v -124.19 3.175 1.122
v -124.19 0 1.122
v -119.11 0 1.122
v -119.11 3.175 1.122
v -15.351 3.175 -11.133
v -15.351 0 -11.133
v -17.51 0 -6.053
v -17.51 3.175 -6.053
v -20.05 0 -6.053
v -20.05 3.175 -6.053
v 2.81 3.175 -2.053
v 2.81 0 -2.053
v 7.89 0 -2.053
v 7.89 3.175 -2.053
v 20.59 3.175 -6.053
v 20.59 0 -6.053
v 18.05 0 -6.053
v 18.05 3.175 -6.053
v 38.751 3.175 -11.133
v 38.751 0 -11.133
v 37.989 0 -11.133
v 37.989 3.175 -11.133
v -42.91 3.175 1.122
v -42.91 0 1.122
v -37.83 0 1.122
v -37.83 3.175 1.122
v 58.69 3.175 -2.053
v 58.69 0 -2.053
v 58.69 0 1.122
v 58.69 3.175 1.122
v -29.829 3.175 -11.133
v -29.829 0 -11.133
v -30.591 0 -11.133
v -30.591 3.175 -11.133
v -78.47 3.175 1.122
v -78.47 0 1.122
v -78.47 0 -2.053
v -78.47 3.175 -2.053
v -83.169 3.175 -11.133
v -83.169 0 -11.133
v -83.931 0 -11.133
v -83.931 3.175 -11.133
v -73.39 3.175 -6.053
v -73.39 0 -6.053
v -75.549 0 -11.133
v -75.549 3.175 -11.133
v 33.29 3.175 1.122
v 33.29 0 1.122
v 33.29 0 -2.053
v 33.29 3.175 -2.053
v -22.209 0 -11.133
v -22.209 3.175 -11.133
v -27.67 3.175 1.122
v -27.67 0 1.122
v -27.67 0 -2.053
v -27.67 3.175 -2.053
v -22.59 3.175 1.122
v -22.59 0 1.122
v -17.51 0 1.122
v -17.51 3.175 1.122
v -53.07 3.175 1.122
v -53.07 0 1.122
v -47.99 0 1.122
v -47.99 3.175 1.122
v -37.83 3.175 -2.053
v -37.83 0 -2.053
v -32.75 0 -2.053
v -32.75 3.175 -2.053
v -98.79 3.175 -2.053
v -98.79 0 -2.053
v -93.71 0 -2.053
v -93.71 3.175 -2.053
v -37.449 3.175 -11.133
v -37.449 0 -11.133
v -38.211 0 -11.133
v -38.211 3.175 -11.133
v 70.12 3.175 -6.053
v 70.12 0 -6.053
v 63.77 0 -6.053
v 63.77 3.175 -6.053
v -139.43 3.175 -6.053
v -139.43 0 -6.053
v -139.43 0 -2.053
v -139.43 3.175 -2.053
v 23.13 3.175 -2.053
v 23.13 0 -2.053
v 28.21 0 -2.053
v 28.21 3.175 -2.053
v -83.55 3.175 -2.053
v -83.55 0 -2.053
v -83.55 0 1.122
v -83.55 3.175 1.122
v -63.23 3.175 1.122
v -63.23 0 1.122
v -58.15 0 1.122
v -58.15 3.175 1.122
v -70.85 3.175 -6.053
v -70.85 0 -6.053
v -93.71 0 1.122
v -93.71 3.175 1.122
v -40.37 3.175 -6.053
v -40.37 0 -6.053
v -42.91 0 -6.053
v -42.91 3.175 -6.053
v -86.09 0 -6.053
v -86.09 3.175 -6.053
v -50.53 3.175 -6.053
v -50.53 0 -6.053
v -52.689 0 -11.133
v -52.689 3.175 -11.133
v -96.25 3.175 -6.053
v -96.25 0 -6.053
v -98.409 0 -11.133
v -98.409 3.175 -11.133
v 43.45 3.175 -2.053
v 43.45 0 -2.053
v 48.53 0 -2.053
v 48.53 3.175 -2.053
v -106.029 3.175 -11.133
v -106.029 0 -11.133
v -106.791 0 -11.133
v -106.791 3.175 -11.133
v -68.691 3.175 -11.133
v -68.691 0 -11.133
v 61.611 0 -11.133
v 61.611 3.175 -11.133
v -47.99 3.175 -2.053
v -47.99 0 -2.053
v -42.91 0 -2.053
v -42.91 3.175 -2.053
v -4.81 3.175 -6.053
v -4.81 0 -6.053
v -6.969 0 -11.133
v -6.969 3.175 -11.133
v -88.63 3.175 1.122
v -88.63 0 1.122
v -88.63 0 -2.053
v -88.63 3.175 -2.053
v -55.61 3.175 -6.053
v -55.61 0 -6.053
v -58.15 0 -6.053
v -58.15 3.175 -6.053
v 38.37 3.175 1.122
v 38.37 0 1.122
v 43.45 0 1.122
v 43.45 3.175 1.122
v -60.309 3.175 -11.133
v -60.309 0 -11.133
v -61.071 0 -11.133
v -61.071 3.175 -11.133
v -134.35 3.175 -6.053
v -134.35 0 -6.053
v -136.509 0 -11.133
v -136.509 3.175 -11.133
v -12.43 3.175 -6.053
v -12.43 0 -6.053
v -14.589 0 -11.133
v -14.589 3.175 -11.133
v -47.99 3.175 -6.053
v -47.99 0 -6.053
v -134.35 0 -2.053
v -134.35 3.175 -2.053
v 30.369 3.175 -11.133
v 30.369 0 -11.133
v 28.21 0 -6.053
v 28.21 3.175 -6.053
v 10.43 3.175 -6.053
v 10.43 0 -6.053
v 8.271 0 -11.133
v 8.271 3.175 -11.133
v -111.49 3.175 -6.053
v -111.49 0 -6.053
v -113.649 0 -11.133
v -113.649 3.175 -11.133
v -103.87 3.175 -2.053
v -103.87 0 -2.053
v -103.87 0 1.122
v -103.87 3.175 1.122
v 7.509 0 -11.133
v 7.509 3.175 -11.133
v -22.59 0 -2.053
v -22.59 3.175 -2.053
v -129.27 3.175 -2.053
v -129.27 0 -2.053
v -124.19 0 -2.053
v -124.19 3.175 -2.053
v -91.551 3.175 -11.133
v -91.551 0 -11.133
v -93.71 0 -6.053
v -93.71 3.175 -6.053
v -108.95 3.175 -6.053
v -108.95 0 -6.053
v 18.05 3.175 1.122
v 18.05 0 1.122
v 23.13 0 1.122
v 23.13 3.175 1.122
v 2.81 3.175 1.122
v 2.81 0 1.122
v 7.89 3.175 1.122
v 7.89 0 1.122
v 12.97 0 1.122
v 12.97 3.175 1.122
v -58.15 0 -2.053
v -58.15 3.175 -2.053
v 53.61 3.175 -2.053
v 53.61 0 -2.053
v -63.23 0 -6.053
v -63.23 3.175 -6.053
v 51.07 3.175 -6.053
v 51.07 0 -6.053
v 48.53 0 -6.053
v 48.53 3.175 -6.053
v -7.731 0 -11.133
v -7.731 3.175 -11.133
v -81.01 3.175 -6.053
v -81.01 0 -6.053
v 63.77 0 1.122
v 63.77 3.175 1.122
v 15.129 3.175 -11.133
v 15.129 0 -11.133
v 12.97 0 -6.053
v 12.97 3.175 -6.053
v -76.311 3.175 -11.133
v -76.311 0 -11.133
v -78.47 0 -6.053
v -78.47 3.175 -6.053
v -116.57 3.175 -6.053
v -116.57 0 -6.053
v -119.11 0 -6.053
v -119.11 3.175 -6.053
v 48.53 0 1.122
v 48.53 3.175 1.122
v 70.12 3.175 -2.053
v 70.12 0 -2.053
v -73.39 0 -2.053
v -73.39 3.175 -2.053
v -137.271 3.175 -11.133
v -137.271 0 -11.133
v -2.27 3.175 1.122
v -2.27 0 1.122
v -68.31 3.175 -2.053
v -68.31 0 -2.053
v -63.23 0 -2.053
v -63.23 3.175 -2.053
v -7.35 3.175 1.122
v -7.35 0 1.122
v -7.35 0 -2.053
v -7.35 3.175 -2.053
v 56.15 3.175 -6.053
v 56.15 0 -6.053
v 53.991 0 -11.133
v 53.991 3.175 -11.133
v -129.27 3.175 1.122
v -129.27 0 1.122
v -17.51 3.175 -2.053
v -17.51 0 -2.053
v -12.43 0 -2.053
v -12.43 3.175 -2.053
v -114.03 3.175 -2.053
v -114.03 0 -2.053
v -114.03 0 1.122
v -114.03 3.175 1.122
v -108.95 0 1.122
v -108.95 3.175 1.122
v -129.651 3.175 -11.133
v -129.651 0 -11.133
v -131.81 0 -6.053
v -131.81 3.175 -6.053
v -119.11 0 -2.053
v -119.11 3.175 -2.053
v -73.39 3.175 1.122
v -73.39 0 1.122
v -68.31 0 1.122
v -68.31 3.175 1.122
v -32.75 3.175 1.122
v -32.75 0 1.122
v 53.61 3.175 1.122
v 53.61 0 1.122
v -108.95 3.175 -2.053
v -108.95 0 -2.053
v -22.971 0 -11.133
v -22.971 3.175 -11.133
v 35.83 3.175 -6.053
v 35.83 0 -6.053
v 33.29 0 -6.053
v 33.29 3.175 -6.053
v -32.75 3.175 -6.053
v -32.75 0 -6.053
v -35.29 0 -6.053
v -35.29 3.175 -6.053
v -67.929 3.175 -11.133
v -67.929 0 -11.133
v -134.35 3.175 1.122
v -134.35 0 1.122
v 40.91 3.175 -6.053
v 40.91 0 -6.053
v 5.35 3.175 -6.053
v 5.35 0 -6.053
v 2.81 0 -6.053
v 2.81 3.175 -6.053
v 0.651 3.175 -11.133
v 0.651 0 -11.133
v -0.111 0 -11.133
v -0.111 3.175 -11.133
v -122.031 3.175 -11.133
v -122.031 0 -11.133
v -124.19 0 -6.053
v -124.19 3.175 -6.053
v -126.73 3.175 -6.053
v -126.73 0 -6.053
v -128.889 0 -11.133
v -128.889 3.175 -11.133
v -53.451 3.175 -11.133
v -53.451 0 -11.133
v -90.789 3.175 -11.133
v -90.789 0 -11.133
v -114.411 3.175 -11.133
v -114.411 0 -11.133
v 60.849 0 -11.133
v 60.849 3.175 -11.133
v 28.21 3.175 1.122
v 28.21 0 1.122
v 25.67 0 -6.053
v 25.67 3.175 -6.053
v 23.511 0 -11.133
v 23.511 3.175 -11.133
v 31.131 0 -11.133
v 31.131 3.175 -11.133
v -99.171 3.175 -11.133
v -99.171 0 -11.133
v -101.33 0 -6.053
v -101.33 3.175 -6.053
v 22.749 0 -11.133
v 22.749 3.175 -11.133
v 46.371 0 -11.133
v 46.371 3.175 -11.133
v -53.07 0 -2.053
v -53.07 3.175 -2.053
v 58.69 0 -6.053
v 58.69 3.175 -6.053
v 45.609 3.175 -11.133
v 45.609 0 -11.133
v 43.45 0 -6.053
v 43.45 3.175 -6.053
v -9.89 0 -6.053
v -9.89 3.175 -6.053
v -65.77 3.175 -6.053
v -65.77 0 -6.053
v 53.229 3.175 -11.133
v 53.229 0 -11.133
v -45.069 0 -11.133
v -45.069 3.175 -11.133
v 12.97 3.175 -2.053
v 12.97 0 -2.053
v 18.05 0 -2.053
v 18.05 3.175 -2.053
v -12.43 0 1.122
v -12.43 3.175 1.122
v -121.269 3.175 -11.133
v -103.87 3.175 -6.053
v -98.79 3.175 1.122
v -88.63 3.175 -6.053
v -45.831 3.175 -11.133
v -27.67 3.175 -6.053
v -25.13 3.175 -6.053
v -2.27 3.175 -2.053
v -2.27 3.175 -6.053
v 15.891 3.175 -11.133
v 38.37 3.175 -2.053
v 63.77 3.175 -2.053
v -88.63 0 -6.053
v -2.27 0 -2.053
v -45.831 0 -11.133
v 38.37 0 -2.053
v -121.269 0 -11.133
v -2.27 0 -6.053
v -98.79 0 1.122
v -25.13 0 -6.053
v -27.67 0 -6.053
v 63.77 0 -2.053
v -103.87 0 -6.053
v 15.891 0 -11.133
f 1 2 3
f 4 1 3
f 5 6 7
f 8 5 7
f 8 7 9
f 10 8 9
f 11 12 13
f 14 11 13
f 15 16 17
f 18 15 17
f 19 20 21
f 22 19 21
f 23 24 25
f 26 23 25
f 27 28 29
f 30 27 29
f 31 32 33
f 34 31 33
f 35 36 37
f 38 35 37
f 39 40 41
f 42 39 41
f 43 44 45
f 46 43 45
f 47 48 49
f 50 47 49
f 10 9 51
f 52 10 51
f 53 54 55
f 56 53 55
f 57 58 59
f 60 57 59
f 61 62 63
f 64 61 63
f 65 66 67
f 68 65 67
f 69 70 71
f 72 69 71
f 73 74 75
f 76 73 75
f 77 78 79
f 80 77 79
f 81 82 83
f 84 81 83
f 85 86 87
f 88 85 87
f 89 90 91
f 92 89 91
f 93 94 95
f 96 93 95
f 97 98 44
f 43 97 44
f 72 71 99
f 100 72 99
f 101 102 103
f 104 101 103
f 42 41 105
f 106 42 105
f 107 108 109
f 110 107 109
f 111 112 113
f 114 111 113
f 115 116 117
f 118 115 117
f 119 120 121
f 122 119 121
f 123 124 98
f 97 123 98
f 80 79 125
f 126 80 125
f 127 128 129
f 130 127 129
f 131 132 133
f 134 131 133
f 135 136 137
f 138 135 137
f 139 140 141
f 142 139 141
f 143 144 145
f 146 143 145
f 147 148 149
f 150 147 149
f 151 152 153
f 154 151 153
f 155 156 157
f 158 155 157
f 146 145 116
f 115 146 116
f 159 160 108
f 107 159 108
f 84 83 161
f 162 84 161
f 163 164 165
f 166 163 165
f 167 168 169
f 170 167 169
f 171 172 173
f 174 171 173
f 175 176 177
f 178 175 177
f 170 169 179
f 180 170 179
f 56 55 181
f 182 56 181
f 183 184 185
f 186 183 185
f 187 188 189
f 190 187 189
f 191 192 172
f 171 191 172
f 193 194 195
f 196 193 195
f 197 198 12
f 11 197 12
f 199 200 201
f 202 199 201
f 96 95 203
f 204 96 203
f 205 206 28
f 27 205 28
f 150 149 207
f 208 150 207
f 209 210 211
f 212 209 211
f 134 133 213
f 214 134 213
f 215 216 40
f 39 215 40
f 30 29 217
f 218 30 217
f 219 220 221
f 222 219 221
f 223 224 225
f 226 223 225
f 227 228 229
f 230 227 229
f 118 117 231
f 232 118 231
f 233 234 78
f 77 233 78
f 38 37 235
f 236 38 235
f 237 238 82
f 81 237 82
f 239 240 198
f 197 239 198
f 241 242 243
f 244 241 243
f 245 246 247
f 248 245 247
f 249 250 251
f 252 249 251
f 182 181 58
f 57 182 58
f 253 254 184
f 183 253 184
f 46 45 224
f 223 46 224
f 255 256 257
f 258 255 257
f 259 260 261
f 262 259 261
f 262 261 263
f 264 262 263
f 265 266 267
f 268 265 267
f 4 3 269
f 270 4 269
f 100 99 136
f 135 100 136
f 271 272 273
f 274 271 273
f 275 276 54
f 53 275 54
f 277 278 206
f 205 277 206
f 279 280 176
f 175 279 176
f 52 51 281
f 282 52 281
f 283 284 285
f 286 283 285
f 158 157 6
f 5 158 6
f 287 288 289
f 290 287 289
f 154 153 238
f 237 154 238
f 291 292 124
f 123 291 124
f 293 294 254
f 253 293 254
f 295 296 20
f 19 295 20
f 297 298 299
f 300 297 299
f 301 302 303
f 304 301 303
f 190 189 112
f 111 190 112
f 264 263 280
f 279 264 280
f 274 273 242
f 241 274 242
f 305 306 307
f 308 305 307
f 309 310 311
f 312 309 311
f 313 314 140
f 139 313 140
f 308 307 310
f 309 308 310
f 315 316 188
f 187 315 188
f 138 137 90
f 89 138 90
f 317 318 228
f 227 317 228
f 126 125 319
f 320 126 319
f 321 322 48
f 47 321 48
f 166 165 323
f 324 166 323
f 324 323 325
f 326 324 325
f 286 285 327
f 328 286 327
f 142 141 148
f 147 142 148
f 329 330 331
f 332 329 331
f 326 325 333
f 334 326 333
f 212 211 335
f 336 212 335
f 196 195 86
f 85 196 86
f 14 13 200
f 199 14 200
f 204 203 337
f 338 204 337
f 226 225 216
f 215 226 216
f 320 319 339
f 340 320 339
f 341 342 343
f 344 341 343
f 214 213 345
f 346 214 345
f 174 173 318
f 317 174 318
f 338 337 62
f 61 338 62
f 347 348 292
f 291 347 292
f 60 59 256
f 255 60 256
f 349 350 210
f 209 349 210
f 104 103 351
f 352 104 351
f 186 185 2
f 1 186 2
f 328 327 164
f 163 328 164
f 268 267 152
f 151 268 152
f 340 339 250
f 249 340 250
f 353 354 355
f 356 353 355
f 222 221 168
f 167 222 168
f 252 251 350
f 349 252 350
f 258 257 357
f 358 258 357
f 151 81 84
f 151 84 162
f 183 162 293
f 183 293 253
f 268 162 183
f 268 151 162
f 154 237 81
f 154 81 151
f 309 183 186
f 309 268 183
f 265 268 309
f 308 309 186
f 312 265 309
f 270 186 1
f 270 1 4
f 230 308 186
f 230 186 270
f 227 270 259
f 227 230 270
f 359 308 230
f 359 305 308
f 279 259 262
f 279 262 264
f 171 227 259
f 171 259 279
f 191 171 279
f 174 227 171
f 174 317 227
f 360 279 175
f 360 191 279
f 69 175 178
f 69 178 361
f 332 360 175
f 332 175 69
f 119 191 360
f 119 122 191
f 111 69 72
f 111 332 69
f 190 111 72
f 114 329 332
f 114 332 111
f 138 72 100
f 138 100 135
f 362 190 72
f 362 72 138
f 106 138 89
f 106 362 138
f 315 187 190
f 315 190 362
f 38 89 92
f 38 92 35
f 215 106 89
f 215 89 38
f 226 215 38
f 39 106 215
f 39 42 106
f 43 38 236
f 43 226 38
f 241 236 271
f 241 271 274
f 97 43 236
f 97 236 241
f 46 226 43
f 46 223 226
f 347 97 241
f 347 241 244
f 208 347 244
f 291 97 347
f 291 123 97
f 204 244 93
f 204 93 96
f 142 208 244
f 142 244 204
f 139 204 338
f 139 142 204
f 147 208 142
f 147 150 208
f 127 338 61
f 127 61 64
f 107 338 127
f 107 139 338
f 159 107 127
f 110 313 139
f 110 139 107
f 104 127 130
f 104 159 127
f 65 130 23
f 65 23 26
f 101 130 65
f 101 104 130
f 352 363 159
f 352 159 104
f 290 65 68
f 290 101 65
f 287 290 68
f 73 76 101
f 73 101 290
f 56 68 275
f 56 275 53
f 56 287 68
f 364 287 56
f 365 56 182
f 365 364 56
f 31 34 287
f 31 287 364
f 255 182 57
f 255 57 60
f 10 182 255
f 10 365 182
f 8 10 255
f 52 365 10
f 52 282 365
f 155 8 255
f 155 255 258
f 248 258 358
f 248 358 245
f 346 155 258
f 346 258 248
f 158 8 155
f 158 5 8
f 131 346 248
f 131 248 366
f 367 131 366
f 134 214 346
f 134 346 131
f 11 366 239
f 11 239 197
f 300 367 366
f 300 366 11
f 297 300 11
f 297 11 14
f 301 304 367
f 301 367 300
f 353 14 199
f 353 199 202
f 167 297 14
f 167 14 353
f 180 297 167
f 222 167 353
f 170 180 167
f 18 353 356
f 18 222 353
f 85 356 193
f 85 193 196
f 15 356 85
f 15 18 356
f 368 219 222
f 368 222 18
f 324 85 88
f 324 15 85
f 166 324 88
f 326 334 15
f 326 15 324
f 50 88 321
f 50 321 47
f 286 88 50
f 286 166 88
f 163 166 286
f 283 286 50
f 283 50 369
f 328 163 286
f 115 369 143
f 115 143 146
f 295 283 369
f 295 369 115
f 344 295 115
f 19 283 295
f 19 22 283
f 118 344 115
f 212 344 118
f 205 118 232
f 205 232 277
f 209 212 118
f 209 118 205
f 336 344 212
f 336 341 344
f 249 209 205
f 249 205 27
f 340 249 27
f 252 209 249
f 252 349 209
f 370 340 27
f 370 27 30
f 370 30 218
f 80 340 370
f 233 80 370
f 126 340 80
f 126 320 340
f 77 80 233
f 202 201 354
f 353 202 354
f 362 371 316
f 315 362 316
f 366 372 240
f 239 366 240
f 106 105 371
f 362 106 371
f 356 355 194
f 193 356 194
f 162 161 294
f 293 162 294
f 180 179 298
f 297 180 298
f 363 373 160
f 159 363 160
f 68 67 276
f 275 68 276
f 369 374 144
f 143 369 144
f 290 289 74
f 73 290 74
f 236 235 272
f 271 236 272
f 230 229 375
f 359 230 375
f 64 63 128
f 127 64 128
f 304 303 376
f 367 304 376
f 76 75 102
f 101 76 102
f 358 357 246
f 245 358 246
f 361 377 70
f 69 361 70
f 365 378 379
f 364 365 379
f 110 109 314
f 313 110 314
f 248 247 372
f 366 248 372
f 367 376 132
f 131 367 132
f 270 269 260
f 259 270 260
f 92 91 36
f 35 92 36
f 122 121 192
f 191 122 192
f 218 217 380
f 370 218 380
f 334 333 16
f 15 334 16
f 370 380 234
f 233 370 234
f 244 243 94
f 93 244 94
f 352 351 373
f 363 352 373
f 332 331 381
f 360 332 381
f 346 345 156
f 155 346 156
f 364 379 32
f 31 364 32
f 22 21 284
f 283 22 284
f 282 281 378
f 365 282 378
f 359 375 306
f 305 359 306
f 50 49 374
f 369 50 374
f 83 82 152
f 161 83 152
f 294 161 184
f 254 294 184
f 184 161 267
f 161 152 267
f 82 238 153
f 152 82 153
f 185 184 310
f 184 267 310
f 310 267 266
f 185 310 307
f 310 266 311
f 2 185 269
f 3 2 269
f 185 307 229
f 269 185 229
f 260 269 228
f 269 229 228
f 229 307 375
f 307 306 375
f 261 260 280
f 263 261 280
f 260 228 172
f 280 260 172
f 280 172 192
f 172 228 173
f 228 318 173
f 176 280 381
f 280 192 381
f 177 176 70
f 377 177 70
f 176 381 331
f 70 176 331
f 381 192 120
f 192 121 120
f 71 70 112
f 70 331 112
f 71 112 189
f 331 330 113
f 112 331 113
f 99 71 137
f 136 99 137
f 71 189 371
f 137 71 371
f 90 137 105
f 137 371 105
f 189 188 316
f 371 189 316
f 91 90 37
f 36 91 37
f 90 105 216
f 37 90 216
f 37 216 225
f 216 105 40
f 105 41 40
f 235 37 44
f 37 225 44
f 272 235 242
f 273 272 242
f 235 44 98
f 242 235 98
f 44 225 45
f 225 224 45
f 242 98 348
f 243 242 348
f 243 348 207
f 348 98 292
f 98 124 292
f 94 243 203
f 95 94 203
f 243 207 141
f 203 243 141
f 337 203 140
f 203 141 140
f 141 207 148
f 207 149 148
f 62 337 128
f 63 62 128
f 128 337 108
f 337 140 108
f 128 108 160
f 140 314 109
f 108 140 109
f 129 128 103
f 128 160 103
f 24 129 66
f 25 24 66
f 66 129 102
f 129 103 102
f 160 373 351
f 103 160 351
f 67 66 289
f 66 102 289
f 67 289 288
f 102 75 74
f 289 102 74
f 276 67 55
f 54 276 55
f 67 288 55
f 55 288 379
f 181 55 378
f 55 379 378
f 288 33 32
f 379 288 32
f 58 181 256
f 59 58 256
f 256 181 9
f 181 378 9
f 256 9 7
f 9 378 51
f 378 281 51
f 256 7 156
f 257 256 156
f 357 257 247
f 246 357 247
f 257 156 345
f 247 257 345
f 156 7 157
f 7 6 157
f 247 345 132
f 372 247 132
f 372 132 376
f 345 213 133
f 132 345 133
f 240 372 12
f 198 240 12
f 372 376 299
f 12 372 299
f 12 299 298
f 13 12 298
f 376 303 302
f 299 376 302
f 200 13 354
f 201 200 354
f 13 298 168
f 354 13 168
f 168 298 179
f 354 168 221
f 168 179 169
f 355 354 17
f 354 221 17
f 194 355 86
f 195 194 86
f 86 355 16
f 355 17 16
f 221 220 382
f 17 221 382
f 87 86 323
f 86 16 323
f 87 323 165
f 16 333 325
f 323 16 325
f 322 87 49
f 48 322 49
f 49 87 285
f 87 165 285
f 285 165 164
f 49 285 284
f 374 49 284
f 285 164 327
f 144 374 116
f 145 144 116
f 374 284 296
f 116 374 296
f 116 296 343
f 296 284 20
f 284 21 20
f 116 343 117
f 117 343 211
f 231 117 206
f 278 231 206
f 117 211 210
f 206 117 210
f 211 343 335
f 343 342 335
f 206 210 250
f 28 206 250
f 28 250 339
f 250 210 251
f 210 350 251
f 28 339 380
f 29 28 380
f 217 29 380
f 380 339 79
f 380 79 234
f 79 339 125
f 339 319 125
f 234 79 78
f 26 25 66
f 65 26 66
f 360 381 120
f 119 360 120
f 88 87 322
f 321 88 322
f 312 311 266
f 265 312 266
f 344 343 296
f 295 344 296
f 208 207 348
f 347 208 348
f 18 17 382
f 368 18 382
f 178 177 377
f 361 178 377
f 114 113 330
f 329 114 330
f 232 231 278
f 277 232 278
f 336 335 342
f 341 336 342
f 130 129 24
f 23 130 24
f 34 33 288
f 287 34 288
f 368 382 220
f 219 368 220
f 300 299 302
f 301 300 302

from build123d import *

# Parameters (mm, degrees)
BOSS_EXTRUDE1_DEPTH = 3.175


with BuildPart() as part:
    # Sketch1 → Boss-Extrude1 (new body)
    with BuildSketch(Plane(origin=(0, 0, 0), x_dir=(1, 0, 0), z_dir=(0, 1, 0))):
        Polygon((-139.430495518, 6.053301935), (-139.430495518, 2.053301935), (-134.350495518, 2.053301935), (-134.350495518, -1.121698065), (-129.270495518, -1.121698065), (-129.270495518, 2.053301935), (-124.190495518, 2.053301935), (-124.190495518, -1.121698065), (-119.110495518, -1.121698065), (-119.110495518, 2.053301935), (-114.030495518, 2.053301935), (-114.030495518, -1.121698065), (-108.950495518, -1.121698065), (-108.950495518, 2.053301935), (-103.870495518, 2.053301935), (-103.870495518, -1.121698065), (-98.790495518, -1.121698065), (-98.790495518, 2.053301935), (-93.710495518, 2.053301935), (-93.710495518, -1.121698065), (-88.630495518, -1.121698065), (-88.630495518, 2.053301935), (-83.550495518, 2.053301935), (-83.550495518, -1.121698065), (-78.470495518, -1.121698065), (-78.470495518, 2.053301935), (-73.390495518, 2.053301935), (-73.390495518, -1.121698065), (-68.310495518, -1.121698065), (-68.310495518, 2.053301935), (-63.230495518, 2.053301935), (-63.230495518, -1.121698065), (-58.150495518, -1.121698065), (-58.150495518, 2.053301935), (-53.070495518, 2.053301935), (-53.070495518, -1.121698065), (-47.990495518, -1.121698065), (-47.990495518, 2.053301935), (-42.910495518, 2.053301935), (-42.910495518, -1.121698065), (-37.830495518, -1.121698065), (-37.830495518, 2.053301935), (-32.750495518, 2.053301935), (-32.750495518, -1.121698065), (-27.670495518, -1.121698065), (-27.670495518, 2.053301935), (-22.590495518, 2.053301935), (-22.590495518, -1.121698065), (-17.510495518, -1.121698065), (-17.510495518, 2.053301935), (-12.430495518, 2.053301935), (-12.430495518, -1.121698065), (-7.350495518, -1.121698065), (-7.350495518, 2.053301935), (-2.270495518, 2.053301935), (-2.270495518, -1.121698065), (2.809504482, -1.121698065), (2.809504482, 2.053301935), (7.889504482, 2.053301935), (7.889504482, -1.121698065), (12.969504482, -1.121698065), (12.969504482, 2.053301935), (18.049504482, 2.053301935), (18.049504482, -1.121698065), (23.129504482, -1.121698065), (23.129504482, 2.053301935), (28.209504482, 2.053301935), (28.209504482, -1.121698065), (33.289504482, -1.121698065), (33.289504482, 2.053301935), (38.369504482, 2.053301935), (38.369504482, -1.121698065), (43.449504482, -1.121698065), (43.449504482, 2.053301935), (48.529504482, 2.053301935), (48.529504482, -1.121698065), (53.609504482, -1.121698065), (53.609504482, 2.053301935), (58.689504482, 2.053301935), (58.689504482, -1.121698065), (63.769504482, -1.121698065), (63.769504482, 2.053301935), (70.119504482, 2.053301935), (70.119504482, 6.053301935), (66.309504482, 6.053301935), (63.769504482, 6.053301935), (61.610504482, 11.133301935), (60.848504482, 11.133301935), (58.689504482, 6.053301935), (56.149504482, 6.053301935), (53.990504482, 11.133301935), (53.228504482, 11.133301935), (51.069504482, 6.053301935), (48.529504482, 6.053301935), (46.370504482, 11.133301935), (45.608504482, 11.133301935), (43.449504482, 6.053301935), (40.909504482, 6.053301935), (38.750504482, 11.133301935), (37.988504482, 11.133301935), (35.829504482, 6.053301935), (33.289504482, 6.053301935), (31.130504482, 11.133301935), (30.368504482, 11.133301935), (28.209504482, 6.053301935), (25.669504482, 6.053301935), (23.510504482, 11.133301935), (22.748504482, 11.133301935), (20.589504482, 6.053301935), (18.049504482, 6.053301935), (15.890504482, 11.133301935), (15.128504482, 11.133301935), (12.969504482, 6.053301935), (10.429504482, 6.053301935), (8.270504482, 11.133301935), (7.508504482, 11.133301935), (5.349504482, 6.053301935), (2.809504482, 6.053301935), (0.650504482, 11.133301935), (-0.111495518, 11.133301935), (-2.270495518, 6.053301935), (-4.810495518, 6.053301935), (-6.969495518, 11.133301935), (-7.731495518, 11.133301935), (-9.890495518, 6.053301935), (-12.430495518, 6.053301935), (-14.589495518, 11.133301935), (-15.351495518, 11.133301935), (-17.510495518, 6.053301935), (-20.050495518, 6.053301935), (-22.209495518, 11.133301935), (-22.971495518, 11.133301935), (-25.130495518, 6.053301935), (-27.670495518, 6.053301935), (-29.829495518, 11.133301935), (-30.591495518, 11.133301935), (-32.750495518, 6.053301935), (-35.290495518, 6.053301935), (-37.449495518, 11.133301935), (-38.211495518, 11.133301935), (-40.370495518, 6.053301935), (-42.910495518, 6.053301935), (-45.069495518, 11.133301935), (-45.831495518, 11.133301935), (-47.990495518, 6.053301935), (-50.530495518, 6.053301935), (-52.689495518, 11.133301935), (-53.451495518, 11.133301935), (-55.610495518, 6.053301935), (-58.150495518, 6.053301935), (-60.309495518, 11.133301935), (-61.071495518, 11.133301935), (-63.230495518, 6.053301935), (-65.770495518, 6.053301935), (-67.929495518, 11.133301935), (-68.691495518, 11.133301935), (-70.850495518, 6.053301935), (-73.390495518, 6.053301935), (-75.549495518, 11.133301935), (-76.311495518, 11.133301935), (-78.470495518, 6.053301935), (-81.010495518, 6.053301935), (-83.169495518, 11.133301935), (-83.931495518, 11.133301935), (-86.090495518, 6.053301935), (-88.630495518, 6.053301935), (-90.789495518, 11.133301935), (-91.551495518, 11.133301935), (-93.710495518, 6.053301935), (-96.250495518, 6.053301935), (-98.409495518, 11.133301935), (-99.171495518, 11.133301935), (-101.330495518, 6.053301935), (-103.870495518, 6.053301935), (-106.029495518, 11.133301935), (-106.791495518, 11.133301935), (-108.950495518, 6.053301935), (-111.490495518, 6.053301935), (-113.649495518, 11.133301935), (-114.411495518, 11.133301935), (-116.570495518, 6.053301935), (-119.110495518, 6.053301935), (-121.269495518, 11.133301935), (-122.031495518, 11.133301935), (-124.190495518, 6.053301935), (-126.730495518, 6.053301935), (-128.889495518, 11.133301935), (-129.651495518, 11.133301935), (-131.810495518, 6.053301935), (-134.350495518, 6.053301935), (-136.509495518, 11.133301935), (-137.271495518, 11.133301935), align=None)
    extrude(amount=BOSS_EXTRUDE1_DEPTH)


solid = part.part
